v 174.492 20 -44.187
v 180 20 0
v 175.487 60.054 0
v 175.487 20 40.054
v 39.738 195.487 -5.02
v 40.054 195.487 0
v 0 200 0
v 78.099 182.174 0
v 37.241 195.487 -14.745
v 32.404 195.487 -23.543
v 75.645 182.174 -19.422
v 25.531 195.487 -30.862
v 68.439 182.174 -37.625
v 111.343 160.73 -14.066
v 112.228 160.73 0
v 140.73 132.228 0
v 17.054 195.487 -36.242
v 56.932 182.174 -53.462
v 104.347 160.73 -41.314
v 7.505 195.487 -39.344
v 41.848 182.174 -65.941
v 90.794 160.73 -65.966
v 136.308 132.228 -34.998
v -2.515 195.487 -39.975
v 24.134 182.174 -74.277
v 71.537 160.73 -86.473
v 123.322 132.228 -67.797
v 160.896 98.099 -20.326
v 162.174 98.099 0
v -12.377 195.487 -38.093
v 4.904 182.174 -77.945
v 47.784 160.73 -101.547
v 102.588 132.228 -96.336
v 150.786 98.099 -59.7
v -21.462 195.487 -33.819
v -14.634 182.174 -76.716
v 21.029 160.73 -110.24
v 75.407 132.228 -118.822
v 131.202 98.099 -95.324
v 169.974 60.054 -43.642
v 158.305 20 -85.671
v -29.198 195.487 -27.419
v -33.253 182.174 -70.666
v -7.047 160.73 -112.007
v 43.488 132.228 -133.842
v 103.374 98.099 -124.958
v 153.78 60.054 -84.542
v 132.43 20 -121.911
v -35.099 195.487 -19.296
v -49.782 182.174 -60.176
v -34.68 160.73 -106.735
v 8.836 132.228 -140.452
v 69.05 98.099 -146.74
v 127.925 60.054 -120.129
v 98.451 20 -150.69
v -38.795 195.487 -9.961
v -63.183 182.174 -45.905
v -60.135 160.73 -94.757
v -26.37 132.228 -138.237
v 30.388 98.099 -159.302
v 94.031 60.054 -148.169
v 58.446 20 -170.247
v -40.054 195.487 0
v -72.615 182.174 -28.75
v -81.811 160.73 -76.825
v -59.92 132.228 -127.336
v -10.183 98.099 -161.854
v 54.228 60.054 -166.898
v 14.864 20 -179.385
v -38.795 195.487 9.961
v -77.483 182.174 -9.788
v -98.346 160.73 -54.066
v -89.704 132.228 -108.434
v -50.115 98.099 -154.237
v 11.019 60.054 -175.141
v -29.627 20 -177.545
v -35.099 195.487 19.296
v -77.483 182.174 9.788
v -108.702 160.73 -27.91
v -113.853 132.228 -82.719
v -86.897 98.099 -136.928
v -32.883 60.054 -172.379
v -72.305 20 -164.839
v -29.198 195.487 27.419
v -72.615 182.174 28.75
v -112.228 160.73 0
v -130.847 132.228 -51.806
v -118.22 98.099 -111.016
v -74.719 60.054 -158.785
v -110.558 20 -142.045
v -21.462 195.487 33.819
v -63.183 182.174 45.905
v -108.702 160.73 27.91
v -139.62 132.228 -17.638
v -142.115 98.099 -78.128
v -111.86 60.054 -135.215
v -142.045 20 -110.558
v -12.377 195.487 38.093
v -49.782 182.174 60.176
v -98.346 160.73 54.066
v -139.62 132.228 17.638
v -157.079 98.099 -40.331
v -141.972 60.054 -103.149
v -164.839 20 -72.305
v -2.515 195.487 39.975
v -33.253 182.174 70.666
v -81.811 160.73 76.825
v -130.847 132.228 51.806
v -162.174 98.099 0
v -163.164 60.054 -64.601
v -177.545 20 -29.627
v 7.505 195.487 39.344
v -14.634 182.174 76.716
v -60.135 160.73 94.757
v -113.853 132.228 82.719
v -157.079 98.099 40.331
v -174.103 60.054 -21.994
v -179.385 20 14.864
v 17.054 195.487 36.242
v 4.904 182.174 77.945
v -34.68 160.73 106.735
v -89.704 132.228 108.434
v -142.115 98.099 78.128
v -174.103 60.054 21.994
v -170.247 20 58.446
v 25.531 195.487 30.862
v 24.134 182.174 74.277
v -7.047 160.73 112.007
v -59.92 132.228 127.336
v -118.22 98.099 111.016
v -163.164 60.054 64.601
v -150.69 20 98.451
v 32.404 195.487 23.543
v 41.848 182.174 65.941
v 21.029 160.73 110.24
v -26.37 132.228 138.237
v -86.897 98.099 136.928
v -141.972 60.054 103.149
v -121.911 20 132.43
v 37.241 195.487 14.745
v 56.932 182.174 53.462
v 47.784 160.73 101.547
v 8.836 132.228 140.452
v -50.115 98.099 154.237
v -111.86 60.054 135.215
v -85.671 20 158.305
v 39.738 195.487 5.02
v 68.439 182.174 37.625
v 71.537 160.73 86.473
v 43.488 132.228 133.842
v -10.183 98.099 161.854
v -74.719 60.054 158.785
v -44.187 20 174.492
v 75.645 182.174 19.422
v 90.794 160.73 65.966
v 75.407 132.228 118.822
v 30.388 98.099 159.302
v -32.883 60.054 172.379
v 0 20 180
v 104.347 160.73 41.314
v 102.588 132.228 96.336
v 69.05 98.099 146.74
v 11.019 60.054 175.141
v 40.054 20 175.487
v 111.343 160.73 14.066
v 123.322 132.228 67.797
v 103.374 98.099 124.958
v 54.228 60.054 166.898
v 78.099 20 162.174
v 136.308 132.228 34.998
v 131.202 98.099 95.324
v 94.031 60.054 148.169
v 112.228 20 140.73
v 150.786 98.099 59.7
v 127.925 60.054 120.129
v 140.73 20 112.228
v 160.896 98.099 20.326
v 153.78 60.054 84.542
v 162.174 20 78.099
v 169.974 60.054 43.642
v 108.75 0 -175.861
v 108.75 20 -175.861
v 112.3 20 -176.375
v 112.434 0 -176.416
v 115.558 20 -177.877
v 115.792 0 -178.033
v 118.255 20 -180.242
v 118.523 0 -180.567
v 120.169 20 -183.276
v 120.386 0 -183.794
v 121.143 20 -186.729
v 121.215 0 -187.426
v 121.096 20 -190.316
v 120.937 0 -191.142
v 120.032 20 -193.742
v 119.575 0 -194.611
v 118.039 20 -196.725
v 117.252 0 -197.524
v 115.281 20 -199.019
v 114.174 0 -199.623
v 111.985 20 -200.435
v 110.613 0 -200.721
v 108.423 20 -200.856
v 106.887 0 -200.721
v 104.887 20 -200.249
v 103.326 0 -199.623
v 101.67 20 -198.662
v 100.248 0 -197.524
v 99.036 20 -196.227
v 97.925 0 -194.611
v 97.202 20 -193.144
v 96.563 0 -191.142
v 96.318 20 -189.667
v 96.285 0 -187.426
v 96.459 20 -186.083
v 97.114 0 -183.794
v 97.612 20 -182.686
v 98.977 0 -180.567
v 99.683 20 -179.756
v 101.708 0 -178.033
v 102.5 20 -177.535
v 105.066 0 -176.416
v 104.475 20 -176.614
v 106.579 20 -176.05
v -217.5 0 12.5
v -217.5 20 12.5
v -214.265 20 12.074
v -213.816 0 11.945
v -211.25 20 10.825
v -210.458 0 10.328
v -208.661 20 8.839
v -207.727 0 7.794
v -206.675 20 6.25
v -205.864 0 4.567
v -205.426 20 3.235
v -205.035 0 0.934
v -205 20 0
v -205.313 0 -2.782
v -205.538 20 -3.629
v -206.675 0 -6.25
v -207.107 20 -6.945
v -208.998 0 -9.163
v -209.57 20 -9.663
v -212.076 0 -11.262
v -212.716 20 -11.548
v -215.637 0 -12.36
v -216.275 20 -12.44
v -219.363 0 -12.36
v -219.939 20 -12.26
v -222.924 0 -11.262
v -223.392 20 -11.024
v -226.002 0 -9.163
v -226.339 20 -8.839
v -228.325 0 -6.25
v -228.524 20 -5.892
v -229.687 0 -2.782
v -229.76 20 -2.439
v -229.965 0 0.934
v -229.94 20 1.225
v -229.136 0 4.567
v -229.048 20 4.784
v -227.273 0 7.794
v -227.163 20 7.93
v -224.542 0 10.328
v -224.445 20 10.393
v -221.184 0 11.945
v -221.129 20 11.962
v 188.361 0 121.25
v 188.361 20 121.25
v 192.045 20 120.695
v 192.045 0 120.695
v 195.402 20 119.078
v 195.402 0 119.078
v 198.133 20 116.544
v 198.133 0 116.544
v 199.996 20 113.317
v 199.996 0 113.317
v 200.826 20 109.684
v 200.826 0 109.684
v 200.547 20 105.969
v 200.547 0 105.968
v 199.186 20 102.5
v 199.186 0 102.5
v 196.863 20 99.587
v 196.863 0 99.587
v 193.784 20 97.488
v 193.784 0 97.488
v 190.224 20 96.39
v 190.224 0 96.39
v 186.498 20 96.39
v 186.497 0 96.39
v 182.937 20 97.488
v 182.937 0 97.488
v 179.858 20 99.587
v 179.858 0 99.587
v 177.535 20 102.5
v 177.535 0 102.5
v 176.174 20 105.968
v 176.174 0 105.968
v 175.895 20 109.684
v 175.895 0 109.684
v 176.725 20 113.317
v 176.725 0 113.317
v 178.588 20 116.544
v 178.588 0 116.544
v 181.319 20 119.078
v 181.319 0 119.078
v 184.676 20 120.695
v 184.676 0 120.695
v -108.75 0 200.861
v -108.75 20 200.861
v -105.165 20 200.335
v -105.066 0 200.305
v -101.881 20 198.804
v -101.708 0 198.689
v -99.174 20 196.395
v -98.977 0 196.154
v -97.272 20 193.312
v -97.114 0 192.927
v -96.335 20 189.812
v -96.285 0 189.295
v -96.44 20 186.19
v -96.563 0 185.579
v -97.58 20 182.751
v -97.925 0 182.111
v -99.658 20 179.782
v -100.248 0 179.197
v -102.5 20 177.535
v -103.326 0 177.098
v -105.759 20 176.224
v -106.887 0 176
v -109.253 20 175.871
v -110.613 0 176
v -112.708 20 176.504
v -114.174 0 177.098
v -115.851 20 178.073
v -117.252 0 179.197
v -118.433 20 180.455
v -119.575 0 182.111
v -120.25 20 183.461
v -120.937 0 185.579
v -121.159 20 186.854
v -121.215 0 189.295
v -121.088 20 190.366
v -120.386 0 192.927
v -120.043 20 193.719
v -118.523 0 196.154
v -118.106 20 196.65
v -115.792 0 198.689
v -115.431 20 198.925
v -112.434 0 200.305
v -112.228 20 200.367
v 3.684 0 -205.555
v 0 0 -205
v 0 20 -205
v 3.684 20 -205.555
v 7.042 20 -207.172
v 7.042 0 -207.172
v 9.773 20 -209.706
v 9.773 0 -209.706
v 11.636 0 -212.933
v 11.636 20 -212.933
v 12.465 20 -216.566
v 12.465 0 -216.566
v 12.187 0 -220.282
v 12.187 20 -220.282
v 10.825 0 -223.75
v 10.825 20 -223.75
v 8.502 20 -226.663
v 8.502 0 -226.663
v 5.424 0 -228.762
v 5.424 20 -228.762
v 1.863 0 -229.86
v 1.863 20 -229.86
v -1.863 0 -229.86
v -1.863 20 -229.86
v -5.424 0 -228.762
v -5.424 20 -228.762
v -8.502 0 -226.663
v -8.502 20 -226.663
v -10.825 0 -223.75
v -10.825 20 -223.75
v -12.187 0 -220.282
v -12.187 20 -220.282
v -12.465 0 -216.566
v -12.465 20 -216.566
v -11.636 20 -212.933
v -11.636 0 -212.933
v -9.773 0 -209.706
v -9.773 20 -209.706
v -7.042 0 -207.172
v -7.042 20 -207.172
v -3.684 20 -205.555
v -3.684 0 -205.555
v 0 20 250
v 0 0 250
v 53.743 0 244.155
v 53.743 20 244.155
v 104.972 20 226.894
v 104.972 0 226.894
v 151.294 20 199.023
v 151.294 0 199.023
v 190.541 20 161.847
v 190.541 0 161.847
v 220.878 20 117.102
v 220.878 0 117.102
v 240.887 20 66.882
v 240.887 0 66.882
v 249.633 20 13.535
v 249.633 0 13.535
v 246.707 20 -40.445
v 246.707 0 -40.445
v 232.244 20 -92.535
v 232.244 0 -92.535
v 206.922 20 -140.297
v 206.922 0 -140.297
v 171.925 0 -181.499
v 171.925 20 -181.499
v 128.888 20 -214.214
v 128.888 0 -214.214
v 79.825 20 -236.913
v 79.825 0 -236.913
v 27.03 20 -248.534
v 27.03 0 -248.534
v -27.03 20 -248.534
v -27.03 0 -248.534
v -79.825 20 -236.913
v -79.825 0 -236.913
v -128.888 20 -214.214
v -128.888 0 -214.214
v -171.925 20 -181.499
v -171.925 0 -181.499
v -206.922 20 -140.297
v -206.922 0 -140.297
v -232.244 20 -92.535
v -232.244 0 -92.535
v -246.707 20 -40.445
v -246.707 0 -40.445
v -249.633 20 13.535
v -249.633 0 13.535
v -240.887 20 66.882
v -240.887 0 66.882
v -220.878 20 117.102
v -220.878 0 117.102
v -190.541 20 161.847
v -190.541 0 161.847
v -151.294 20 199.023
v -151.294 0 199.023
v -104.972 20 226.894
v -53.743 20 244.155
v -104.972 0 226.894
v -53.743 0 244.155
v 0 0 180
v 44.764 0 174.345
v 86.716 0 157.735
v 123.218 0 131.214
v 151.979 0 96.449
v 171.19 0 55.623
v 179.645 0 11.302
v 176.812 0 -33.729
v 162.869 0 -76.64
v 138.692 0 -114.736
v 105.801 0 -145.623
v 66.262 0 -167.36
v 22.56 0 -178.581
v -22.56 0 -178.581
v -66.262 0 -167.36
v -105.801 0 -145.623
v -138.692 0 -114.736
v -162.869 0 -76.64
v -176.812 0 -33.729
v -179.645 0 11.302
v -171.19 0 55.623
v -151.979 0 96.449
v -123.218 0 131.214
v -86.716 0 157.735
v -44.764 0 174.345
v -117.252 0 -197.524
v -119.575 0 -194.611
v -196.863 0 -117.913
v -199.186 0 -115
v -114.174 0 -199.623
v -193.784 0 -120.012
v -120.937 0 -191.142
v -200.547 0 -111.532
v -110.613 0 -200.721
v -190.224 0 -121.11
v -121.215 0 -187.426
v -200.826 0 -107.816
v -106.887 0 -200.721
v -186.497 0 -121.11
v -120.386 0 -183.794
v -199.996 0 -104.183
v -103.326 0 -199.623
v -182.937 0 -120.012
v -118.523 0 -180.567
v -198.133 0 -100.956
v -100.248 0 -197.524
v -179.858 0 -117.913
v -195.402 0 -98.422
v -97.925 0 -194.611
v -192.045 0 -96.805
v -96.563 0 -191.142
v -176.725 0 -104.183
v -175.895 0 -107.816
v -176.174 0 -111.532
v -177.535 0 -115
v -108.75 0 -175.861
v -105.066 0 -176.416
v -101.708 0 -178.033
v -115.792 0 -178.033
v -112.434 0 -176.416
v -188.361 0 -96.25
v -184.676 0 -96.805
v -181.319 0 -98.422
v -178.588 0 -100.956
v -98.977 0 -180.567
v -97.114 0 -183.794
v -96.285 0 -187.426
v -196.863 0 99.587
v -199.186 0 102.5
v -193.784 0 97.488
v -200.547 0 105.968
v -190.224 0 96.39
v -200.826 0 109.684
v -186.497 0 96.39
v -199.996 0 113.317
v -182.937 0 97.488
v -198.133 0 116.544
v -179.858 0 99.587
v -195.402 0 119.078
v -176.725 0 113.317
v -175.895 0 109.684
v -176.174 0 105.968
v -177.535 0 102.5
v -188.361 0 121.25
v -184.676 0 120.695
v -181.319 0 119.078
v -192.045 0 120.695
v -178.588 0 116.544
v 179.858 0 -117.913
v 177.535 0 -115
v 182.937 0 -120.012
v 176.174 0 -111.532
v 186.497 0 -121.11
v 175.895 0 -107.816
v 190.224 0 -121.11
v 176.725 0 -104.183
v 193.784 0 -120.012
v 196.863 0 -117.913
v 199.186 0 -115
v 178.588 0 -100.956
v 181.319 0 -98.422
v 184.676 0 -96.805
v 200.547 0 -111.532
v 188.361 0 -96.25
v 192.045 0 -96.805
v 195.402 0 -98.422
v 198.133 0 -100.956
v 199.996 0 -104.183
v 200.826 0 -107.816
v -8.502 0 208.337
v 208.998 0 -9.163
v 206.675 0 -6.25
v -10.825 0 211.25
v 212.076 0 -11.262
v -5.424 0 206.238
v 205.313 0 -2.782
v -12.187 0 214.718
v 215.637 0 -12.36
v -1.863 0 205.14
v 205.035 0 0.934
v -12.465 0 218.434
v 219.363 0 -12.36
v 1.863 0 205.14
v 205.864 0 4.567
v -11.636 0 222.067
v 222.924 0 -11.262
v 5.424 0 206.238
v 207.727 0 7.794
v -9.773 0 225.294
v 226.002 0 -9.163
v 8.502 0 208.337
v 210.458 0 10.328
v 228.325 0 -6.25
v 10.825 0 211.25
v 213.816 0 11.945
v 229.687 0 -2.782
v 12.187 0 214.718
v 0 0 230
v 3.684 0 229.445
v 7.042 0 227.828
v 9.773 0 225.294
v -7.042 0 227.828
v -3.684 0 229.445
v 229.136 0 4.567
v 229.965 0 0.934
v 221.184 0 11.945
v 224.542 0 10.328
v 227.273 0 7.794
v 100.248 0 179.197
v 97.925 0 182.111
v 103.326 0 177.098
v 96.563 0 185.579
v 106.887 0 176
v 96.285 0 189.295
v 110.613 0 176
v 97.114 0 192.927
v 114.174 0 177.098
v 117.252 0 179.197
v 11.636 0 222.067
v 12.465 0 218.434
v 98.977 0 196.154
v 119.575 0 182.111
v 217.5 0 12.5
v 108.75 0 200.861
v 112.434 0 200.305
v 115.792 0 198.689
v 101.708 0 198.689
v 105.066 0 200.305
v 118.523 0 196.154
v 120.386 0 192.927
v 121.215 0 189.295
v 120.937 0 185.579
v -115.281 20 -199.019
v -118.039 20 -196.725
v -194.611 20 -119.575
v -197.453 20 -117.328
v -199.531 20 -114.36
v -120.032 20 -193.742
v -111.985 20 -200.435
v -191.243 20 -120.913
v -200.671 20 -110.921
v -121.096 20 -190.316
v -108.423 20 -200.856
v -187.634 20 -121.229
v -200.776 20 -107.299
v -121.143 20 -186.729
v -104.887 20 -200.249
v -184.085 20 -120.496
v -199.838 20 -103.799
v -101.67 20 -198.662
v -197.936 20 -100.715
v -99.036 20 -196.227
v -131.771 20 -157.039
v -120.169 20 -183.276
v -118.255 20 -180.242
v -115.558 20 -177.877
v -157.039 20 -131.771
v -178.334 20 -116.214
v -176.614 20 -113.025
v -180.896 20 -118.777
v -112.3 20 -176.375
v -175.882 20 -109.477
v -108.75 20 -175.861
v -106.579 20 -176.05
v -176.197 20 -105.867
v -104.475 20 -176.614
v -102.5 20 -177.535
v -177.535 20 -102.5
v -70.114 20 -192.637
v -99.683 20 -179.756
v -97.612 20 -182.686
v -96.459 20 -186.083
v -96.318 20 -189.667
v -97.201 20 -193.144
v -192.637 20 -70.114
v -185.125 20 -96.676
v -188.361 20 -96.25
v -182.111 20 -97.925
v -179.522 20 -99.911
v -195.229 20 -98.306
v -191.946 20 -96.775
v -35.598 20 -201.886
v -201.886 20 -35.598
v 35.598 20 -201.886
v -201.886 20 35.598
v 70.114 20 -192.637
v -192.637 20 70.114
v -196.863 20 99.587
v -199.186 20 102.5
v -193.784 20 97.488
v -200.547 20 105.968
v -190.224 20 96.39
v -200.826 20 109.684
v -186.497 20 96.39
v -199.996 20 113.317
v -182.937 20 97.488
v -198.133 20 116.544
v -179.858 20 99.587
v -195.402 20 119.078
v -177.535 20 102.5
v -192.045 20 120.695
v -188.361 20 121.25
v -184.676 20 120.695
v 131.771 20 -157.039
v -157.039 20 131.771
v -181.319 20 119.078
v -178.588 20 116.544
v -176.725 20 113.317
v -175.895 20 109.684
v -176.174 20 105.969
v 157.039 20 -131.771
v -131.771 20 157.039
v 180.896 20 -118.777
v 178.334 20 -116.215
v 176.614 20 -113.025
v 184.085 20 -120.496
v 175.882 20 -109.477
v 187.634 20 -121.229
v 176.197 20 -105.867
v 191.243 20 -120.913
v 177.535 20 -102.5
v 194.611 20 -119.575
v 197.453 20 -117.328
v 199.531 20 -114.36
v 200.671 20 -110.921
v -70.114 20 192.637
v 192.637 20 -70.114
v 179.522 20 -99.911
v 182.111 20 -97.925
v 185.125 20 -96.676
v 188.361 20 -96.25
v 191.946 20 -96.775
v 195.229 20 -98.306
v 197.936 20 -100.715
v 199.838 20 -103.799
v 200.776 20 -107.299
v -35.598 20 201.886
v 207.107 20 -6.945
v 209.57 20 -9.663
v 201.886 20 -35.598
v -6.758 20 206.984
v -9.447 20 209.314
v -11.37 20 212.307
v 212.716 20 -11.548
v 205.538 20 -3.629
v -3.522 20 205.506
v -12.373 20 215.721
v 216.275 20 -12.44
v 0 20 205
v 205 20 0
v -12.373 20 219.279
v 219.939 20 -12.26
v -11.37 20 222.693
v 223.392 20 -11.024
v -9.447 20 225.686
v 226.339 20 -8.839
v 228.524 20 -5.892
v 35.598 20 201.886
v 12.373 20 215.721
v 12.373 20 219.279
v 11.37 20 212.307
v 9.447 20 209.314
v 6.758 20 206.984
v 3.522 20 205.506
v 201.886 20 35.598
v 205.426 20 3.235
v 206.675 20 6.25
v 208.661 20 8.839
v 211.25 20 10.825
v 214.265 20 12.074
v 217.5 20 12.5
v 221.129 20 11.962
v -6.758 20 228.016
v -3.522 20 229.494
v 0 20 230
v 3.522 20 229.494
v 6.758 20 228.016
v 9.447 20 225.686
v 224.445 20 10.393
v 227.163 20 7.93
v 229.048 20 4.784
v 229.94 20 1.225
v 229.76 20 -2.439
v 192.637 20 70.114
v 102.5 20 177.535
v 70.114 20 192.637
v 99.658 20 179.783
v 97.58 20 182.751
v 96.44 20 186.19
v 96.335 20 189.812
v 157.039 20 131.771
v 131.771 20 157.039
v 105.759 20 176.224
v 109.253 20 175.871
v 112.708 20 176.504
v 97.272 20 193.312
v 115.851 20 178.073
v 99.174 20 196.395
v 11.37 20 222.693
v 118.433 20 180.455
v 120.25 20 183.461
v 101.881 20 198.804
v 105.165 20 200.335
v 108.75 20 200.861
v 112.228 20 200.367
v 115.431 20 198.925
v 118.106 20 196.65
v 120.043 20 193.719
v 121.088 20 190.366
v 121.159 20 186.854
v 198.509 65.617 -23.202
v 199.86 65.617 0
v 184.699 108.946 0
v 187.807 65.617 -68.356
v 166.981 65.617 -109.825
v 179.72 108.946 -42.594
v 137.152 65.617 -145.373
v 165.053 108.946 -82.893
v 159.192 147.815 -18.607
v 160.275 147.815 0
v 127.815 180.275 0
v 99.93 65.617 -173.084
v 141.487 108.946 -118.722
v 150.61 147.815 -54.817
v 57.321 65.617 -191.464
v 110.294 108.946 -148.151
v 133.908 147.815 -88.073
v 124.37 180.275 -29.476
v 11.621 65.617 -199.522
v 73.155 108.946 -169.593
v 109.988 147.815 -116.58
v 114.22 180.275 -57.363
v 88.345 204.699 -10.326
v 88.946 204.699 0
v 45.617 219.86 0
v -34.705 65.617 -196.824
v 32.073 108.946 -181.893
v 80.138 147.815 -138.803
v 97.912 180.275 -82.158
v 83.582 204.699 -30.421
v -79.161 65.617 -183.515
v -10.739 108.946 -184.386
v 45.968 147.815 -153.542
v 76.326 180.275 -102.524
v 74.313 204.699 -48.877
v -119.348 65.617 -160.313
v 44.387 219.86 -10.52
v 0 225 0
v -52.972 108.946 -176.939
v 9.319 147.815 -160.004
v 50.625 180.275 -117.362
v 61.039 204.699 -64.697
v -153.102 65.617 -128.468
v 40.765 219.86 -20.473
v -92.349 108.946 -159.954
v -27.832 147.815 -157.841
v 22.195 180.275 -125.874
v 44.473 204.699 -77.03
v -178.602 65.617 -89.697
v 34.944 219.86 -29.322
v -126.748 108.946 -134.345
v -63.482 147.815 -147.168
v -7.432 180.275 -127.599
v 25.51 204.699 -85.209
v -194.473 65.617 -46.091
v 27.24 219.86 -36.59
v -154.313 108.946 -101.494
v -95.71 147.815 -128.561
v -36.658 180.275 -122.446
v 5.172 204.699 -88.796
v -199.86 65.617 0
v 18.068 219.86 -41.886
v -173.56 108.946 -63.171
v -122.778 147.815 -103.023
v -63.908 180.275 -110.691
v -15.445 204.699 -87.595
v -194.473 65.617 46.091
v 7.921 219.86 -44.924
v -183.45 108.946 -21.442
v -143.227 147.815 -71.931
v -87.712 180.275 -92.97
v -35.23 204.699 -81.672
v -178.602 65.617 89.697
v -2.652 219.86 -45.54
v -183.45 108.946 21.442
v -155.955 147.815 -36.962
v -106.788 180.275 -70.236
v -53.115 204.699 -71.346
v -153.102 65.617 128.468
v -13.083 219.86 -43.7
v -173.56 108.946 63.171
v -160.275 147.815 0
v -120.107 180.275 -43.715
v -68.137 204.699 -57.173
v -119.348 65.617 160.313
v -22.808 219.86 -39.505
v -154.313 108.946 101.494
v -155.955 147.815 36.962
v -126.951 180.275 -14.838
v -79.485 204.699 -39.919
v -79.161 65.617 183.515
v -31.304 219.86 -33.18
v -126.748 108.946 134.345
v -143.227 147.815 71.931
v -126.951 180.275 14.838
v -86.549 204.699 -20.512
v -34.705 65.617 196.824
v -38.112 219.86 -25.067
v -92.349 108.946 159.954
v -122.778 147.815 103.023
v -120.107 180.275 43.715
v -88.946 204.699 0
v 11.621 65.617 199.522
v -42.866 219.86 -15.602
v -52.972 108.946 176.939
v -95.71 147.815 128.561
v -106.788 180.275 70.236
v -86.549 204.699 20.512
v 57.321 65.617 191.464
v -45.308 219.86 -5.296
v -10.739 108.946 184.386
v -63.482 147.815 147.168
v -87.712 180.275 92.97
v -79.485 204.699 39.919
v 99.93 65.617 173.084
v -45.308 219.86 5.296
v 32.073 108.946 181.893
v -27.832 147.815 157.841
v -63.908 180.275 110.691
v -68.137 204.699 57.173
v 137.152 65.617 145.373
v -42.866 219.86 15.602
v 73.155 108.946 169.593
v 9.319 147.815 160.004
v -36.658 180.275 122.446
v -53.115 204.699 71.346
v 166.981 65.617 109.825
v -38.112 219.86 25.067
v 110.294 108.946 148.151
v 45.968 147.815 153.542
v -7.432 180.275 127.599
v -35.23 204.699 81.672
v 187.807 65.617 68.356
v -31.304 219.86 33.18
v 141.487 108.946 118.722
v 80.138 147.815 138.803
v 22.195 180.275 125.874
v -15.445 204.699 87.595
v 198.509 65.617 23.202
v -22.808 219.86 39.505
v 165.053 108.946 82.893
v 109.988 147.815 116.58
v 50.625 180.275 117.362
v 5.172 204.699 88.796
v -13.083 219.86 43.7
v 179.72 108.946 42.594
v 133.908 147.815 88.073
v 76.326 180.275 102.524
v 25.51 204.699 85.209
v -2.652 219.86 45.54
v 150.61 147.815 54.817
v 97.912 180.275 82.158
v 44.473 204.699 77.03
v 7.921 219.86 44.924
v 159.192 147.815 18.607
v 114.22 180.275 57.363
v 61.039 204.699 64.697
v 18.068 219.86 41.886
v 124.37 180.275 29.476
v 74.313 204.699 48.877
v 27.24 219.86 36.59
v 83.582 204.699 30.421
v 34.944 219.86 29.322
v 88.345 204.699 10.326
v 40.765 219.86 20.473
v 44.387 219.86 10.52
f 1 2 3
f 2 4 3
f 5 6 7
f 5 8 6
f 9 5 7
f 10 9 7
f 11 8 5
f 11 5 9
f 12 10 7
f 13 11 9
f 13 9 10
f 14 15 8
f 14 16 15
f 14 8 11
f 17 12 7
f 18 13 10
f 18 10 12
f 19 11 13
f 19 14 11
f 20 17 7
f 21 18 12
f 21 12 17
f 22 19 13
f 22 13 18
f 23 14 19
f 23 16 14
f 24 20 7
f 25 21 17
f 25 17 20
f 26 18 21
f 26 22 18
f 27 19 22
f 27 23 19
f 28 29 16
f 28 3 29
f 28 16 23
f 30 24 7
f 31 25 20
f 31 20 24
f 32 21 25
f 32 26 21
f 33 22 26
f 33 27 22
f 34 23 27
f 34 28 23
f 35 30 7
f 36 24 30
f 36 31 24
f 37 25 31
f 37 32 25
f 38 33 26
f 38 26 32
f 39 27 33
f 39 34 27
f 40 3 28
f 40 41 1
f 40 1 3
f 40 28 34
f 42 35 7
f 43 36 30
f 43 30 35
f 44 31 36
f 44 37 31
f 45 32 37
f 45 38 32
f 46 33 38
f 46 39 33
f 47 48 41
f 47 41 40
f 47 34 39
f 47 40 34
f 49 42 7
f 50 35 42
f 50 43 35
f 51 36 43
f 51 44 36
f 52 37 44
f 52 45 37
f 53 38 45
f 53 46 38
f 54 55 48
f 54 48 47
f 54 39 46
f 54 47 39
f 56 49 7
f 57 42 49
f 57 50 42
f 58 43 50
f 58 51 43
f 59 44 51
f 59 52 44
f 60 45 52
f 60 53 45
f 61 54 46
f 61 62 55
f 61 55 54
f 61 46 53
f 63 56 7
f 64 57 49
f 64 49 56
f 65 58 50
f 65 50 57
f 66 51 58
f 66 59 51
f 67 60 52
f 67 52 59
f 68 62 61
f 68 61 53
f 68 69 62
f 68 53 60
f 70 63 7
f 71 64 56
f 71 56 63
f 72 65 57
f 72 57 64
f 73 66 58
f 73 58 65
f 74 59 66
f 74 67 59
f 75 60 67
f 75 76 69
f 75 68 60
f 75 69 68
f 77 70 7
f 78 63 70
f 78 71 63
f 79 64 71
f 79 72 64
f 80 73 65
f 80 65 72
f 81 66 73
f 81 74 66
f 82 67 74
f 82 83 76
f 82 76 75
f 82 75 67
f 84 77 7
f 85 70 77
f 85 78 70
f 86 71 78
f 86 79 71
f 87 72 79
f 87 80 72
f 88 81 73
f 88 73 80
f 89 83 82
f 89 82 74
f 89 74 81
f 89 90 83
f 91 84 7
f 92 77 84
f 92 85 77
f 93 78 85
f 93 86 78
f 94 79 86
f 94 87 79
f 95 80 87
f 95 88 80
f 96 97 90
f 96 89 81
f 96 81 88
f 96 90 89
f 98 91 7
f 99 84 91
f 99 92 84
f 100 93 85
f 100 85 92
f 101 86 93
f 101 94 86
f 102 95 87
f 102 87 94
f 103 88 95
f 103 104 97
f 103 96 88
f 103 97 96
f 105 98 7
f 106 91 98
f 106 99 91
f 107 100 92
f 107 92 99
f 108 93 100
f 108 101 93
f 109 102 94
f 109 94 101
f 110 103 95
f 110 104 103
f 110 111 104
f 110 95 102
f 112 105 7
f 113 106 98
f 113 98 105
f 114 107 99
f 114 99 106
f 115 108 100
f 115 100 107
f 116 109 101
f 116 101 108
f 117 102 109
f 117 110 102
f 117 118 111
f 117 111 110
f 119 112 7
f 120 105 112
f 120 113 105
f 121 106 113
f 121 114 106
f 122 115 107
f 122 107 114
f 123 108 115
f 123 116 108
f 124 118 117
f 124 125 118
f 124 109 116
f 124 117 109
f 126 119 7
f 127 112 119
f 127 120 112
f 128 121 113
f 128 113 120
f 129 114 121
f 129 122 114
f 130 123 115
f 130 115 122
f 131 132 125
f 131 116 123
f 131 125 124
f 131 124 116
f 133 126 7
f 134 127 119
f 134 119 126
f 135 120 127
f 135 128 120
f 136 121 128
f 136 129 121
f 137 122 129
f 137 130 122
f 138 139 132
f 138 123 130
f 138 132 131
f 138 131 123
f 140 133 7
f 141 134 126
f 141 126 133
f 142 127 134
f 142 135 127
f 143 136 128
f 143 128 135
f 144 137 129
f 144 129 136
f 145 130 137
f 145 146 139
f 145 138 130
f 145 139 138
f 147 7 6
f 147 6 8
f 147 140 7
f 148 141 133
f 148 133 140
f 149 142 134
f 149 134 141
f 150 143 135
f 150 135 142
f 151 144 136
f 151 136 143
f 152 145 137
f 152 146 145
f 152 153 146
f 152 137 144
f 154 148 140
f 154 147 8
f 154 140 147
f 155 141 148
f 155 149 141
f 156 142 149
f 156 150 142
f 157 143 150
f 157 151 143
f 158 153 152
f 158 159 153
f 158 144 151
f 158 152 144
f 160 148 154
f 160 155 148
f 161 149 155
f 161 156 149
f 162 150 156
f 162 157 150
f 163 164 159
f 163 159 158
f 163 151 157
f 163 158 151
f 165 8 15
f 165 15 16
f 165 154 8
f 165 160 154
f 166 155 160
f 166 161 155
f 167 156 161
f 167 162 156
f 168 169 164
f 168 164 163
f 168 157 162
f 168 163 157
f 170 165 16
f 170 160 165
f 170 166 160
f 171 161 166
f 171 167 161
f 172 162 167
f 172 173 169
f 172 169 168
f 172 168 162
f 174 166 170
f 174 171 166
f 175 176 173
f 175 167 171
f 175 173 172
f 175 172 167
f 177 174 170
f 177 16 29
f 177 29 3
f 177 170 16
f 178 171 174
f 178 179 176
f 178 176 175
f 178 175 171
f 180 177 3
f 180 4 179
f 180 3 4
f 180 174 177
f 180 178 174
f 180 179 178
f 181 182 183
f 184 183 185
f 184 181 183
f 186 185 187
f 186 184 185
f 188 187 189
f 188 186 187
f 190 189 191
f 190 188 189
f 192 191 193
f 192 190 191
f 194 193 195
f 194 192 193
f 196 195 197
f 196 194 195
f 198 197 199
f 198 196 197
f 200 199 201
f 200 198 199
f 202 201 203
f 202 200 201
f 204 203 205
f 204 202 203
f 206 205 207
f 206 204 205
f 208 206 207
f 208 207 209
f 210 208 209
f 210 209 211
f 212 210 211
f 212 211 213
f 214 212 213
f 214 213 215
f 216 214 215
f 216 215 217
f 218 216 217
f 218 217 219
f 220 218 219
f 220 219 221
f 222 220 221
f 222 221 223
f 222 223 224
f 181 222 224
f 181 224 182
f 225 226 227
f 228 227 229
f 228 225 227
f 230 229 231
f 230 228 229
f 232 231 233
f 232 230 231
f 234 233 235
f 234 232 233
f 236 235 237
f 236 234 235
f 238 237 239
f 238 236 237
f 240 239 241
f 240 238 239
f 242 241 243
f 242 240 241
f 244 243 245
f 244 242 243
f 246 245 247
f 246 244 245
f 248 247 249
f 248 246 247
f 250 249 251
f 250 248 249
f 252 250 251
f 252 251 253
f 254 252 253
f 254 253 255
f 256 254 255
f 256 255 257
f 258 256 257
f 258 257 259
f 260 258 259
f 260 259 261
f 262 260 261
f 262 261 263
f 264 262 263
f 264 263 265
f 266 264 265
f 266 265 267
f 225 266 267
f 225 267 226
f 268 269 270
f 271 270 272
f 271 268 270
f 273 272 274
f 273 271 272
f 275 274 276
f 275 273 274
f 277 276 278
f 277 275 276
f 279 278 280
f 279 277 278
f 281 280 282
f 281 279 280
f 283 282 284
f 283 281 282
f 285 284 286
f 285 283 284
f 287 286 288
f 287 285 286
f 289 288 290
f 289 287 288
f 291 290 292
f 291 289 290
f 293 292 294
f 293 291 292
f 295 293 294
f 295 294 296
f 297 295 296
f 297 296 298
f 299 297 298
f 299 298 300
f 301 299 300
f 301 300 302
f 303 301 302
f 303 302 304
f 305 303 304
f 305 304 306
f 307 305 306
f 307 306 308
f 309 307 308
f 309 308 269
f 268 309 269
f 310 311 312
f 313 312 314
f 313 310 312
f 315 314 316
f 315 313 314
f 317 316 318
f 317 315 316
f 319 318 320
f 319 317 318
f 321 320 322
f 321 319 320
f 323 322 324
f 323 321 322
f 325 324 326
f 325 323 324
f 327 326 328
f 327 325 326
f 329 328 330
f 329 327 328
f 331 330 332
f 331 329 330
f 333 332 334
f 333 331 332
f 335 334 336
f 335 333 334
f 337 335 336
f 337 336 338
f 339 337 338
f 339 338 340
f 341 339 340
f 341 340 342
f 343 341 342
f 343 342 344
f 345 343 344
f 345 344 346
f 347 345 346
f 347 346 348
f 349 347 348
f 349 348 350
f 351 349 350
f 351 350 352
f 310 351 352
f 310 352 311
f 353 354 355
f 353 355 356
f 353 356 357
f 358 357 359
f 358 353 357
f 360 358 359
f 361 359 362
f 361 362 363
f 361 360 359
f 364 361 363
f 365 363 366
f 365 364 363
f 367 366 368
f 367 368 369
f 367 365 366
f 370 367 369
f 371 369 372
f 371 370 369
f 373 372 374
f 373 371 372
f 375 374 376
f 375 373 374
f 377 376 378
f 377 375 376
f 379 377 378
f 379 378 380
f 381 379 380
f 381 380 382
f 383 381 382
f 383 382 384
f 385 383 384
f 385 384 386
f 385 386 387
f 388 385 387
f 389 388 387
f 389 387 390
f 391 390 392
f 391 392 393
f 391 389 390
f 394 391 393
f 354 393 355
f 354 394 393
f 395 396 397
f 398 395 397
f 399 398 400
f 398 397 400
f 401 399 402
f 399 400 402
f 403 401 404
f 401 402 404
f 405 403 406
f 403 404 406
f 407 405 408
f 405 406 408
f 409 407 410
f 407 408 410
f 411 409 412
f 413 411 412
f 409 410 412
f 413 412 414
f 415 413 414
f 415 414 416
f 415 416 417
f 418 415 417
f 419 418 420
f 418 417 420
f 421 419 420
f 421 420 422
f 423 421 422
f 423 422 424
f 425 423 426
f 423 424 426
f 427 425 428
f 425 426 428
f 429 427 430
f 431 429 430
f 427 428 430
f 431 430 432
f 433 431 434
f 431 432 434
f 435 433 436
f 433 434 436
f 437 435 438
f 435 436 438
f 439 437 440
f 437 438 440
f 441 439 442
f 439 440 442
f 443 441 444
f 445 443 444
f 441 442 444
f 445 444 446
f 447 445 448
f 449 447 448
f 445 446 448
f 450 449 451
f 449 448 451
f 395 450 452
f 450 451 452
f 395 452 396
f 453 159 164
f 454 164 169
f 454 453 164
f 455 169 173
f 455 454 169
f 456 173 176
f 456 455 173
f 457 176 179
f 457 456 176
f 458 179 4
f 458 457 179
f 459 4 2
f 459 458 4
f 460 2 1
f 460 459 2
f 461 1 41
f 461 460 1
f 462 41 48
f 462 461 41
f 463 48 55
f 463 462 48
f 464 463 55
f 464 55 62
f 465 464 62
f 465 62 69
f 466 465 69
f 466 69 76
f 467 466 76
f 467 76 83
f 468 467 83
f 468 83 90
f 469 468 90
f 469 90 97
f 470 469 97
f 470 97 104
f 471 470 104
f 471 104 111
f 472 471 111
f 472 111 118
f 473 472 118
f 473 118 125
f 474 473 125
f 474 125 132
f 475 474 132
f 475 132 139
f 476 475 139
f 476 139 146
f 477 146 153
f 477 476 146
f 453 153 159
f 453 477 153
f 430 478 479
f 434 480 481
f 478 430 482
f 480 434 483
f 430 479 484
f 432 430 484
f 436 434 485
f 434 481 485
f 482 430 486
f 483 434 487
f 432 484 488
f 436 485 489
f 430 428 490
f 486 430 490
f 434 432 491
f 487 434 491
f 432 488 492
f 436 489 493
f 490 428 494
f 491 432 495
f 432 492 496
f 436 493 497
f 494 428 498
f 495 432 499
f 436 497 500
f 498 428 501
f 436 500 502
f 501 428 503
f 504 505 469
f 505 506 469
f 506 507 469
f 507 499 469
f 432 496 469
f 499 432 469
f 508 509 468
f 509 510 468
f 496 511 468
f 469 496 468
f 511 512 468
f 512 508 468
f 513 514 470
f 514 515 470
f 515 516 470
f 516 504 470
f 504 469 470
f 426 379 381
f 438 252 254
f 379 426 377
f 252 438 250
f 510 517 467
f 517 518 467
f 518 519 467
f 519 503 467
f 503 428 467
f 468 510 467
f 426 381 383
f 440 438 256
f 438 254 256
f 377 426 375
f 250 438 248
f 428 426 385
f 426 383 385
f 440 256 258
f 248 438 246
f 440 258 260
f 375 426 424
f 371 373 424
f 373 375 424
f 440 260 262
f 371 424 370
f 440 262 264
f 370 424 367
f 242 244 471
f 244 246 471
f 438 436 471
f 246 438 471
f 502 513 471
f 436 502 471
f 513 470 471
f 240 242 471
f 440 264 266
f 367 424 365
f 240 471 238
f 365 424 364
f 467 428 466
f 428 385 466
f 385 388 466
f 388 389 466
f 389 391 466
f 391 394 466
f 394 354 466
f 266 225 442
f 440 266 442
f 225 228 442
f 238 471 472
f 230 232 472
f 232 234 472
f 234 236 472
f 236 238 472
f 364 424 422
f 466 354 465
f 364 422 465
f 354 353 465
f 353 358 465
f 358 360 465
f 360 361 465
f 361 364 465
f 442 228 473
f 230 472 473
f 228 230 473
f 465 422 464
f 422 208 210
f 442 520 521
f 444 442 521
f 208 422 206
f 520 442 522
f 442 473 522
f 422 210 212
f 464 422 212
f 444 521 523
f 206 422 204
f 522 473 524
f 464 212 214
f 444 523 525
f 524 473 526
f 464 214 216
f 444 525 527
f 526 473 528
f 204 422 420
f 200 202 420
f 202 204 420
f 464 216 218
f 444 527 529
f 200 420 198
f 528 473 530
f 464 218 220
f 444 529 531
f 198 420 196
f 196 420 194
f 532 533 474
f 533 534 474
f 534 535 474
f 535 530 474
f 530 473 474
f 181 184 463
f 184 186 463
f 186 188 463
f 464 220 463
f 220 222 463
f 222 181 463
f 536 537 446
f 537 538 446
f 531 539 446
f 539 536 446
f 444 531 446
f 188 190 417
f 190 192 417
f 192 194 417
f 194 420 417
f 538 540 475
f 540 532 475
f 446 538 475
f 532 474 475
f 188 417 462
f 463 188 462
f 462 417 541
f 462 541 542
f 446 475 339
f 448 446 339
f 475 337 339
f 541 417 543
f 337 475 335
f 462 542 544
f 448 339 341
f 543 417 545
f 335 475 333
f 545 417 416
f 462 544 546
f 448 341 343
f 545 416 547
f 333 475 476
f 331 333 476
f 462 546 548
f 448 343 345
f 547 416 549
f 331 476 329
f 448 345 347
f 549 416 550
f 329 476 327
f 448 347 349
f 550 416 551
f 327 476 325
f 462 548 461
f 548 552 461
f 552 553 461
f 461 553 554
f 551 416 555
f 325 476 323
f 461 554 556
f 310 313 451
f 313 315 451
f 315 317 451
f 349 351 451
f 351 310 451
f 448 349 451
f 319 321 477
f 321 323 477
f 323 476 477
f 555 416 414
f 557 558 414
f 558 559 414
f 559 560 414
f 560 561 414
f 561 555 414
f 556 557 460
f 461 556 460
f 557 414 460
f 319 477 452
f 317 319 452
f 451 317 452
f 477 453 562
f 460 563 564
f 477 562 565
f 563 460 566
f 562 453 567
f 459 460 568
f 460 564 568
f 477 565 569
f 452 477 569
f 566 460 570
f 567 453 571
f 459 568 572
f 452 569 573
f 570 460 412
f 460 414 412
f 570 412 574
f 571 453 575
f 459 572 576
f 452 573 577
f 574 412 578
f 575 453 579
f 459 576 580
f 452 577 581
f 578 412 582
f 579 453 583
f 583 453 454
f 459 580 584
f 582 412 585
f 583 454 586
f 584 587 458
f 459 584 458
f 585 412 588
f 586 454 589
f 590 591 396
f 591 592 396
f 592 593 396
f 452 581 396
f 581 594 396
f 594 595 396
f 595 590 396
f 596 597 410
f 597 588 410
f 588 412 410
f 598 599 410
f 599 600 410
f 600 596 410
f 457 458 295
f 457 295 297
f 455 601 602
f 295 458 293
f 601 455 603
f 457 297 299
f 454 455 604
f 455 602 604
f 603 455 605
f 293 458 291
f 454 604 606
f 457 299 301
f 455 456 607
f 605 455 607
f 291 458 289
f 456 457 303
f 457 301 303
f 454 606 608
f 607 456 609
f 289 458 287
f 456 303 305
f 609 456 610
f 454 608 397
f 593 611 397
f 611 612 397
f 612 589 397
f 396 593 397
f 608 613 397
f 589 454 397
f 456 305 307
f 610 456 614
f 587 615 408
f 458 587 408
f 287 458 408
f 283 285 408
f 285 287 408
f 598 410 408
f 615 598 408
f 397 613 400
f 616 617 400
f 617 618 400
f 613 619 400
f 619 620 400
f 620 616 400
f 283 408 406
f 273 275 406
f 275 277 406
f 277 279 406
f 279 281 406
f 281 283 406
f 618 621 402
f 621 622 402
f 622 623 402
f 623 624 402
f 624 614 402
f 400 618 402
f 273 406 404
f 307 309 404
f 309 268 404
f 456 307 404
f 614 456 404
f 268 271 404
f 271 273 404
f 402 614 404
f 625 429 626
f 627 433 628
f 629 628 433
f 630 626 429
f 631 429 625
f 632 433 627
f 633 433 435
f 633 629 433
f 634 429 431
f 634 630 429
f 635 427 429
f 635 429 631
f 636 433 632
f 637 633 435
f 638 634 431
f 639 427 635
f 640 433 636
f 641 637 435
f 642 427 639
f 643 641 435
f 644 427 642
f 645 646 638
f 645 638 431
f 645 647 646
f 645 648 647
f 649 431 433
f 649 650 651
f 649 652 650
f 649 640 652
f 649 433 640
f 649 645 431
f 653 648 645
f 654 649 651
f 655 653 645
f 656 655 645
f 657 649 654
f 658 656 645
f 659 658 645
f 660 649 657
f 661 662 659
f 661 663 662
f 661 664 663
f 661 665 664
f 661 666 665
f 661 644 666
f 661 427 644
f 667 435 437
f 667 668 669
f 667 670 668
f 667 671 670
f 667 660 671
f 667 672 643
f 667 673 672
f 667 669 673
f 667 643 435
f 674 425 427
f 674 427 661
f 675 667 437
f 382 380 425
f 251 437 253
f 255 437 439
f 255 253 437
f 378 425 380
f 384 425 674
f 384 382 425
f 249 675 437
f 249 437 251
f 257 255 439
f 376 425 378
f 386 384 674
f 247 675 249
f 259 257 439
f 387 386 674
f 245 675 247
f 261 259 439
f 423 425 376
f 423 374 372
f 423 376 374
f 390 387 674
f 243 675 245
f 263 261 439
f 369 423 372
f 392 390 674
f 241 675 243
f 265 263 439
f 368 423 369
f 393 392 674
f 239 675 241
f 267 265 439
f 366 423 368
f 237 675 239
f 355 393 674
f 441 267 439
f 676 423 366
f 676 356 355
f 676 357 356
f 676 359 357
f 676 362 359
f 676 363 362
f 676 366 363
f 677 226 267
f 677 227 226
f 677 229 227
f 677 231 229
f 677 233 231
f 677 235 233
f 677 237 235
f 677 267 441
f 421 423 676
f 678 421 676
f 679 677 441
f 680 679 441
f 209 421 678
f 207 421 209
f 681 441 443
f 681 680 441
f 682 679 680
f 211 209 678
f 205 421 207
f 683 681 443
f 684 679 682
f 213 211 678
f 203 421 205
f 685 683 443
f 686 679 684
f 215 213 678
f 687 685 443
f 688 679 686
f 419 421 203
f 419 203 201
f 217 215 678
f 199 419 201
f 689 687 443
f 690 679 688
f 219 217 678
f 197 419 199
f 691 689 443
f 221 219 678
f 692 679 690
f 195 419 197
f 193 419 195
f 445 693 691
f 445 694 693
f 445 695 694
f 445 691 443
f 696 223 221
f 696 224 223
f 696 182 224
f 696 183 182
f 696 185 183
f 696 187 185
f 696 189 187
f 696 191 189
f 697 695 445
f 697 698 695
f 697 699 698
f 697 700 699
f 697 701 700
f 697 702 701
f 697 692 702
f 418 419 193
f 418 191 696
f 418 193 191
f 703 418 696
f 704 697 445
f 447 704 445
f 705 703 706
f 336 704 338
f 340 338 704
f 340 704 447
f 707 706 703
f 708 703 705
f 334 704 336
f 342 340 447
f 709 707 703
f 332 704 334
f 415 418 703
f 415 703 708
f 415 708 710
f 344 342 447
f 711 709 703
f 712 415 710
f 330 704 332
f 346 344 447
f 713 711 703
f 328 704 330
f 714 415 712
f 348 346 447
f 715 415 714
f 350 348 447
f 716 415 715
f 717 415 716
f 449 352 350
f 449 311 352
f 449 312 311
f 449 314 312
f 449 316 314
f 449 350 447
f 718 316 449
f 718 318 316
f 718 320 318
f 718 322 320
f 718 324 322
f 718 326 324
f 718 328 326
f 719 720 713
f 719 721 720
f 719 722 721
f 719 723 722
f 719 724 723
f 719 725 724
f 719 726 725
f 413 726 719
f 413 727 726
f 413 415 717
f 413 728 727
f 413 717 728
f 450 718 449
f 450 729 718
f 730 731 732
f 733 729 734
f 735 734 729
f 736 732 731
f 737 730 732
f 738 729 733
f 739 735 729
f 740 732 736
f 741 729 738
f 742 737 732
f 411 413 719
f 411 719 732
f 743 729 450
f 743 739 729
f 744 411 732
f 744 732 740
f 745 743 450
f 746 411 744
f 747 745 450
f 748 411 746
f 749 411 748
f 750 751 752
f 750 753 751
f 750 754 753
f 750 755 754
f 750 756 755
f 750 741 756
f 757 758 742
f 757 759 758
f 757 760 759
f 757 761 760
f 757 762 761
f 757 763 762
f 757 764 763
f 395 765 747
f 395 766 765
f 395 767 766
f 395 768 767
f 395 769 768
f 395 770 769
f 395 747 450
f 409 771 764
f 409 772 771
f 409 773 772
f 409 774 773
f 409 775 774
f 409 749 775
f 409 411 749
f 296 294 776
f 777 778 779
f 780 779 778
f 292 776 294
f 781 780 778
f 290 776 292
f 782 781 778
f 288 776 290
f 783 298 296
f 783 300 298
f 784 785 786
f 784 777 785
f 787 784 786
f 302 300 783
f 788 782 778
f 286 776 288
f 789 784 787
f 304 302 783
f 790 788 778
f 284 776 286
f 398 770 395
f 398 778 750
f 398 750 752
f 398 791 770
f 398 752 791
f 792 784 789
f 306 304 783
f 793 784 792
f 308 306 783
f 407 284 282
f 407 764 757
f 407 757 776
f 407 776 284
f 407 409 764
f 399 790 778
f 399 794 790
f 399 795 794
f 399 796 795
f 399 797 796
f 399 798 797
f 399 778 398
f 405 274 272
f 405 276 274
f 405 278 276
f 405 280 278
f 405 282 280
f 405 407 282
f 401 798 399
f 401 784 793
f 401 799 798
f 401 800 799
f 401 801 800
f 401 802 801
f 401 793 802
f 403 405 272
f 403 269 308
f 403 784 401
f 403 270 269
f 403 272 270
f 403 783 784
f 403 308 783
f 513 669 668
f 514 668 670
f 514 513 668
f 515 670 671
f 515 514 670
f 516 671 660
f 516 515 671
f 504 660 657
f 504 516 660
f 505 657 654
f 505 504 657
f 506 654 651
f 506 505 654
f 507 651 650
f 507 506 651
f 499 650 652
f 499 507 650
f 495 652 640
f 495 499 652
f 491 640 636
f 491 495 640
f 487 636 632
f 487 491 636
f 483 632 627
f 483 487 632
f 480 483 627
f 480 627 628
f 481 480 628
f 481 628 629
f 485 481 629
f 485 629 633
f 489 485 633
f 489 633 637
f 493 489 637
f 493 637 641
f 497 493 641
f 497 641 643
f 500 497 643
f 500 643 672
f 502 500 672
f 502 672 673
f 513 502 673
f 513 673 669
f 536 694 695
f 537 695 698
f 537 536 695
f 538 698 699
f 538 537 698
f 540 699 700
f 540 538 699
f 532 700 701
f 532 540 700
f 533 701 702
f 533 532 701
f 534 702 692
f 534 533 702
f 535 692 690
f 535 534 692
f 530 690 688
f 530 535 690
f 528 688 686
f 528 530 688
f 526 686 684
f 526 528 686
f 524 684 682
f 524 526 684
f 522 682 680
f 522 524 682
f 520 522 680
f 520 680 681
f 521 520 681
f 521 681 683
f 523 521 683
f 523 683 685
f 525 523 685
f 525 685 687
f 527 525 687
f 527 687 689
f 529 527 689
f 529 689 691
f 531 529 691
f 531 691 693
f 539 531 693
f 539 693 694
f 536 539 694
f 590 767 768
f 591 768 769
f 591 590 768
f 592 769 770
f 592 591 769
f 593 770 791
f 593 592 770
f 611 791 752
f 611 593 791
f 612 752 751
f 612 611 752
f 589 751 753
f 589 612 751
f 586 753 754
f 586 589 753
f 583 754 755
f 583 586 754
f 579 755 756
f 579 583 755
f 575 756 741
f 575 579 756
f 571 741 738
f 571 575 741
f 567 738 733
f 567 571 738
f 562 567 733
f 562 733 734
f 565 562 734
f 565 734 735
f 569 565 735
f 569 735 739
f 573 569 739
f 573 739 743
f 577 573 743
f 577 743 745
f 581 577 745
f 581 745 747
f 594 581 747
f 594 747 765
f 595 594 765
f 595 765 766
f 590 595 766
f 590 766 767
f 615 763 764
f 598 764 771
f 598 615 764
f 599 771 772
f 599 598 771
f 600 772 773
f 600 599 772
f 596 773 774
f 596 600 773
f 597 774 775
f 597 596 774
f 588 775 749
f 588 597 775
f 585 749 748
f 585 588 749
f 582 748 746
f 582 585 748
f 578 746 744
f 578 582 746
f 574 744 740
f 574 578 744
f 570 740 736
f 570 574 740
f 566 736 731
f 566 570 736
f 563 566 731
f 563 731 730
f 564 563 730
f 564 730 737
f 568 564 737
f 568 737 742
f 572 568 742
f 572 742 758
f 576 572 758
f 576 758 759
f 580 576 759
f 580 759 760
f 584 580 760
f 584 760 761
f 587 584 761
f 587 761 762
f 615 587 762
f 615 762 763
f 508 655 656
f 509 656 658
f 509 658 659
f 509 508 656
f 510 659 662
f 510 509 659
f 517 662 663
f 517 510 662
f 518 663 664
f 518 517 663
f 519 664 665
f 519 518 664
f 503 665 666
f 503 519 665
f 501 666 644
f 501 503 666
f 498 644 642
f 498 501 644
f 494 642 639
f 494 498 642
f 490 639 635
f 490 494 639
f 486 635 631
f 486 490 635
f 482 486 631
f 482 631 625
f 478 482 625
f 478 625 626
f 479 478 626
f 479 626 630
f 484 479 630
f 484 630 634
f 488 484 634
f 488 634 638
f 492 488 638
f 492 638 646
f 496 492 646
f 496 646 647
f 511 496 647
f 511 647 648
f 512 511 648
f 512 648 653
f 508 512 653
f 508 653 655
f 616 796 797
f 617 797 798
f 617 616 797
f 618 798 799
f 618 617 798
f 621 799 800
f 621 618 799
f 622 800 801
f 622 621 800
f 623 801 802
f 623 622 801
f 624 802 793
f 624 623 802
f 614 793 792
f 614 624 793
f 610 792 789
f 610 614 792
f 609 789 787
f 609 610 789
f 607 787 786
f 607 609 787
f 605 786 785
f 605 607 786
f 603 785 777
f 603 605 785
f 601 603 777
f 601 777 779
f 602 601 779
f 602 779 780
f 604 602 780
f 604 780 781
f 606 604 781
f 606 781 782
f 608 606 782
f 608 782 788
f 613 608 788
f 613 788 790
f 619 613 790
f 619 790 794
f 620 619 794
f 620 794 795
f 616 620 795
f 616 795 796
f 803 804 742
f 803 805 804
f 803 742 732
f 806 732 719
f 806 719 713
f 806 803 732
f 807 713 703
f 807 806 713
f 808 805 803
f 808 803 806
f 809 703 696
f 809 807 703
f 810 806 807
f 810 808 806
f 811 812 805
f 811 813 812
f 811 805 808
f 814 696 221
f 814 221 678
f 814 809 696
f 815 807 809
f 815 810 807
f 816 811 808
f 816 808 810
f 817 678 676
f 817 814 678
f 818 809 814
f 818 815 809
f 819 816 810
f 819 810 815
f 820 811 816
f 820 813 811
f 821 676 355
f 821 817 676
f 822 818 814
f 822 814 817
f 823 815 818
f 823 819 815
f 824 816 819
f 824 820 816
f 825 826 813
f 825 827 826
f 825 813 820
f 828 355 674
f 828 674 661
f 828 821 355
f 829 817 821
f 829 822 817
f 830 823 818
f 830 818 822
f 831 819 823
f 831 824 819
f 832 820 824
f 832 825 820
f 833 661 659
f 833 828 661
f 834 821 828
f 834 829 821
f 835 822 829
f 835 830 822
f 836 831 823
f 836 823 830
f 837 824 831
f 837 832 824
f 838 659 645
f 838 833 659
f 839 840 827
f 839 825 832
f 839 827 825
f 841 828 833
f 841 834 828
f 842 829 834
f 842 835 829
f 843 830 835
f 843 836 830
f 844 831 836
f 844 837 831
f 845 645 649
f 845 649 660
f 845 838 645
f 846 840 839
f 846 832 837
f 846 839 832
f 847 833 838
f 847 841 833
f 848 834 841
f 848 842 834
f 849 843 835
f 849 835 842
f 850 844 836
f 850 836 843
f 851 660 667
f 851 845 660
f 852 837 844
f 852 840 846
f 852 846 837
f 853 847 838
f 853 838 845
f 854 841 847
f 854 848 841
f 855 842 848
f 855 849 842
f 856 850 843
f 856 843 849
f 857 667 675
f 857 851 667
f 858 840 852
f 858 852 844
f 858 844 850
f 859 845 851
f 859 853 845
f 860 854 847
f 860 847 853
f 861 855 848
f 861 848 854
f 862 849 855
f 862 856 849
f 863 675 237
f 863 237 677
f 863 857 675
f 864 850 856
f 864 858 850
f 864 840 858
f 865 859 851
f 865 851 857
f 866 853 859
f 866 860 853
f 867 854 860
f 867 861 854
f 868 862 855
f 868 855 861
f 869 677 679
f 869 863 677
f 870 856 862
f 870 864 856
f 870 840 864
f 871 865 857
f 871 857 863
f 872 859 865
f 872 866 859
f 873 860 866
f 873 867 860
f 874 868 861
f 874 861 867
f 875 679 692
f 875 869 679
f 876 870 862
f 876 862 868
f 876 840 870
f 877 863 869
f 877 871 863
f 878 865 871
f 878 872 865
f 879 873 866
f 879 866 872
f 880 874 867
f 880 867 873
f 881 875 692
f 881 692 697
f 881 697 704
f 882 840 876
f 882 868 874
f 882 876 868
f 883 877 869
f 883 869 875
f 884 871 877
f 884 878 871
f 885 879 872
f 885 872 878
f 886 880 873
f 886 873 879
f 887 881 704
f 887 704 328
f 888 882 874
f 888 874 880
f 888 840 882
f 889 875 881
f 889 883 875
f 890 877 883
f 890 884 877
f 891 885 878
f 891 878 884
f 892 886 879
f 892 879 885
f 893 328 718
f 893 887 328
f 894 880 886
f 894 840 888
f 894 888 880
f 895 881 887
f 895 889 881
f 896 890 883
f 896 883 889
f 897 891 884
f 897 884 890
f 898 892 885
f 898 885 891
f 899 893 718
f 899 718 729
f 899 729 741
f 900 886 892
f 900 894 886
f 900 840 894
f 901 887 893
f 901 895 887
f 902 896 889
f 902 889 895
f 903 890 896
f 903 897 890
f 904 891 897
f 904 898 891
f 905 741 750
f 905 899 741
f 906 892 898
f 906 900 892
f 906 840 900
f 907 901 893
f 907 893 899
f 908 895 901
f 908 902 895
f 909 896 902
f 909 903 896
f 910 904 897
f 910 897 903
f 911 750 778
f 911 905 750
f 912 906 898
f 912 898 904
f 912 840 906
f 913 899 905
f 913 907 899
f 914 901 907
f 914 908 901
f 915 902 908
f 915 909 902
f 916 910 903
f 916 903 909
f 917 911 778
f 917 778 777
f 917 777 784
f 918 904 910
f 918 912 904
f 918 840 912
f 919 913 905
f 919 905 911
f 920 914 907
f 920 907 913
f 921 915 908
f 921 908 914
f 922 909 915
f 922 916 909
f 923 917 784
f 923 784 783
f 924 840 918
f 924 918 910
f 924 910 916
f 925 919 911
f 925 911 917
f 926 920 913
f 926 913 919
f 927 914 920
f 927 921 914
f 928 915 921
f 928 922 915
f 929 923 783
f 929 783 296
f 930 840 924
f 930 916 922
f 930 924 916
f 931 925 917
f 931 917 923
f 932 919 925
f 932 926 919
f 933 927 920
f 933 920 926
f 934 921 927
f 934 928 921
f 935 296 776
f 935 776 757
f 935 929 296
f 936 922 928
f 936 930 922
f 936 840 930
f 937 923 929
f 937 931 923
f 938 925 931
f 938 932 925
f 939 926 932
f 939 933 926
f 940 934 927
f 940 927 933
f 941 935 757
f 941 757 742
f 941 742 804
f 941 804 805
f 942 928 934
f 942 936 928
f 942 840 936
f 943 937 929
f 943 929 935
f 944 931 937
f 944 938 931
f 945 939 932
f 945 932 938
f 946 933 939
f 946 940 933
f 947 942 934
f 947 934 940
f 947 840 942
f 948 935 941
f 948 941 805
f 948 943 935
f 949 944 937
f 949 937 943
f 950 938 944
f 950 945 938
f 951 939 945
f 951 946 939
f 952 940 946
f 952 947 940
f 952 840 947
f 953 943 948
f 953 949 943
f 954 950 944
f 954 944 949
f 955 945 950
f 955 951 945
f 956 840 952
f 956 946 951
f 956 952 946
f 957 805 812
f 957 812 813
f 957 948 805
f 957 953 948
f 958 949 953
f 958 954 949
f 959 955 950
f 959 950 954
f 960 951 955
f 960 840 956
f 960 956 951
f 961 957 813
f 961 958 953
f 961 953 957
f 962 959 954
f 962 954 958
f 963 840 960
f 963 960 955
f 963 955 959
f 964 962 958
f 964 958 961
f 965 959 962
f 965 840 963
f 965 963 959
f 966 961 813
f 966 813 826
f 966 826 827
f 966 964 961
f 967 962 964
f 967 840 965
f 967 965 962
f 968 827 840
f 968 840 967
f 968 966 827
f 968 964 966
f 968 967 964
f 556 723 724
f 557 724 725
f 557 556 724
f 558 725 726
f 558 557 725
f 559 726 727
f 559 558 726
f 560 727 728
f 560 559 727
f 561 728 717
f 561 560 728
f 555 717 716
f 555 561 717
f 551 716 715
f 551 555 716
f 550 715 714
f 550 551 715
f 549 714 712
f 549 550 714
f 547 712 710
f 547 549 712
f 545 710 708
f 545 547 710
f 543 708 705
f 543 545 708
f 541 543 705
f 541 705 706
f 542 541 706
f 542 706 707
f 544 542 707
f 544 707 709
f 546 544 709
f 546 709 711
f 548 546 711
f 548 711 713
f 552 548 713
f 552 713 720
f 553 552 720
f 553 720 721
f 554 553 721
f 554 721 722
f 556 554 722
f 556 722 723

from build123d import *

# Parameters (mm, degrees)
SKETCH1_R           = 250
SKETCH1_R_2         = 180
SKETCH1_R_3         = 12.5
BOSS_EXTRUDE1_DEPTH = 20


# Read off the part's stored shape, not the designer's step: Revolve1
with BuildPart() as part:
    # Sketch1 → Boss-Extrude1 (new body)
    with BuildSketch(Plane(origin=(0, 0, 0), x_dir=(1, 0, 0), z_dir=(0, 1, 0))):
        with Locations(Location((0, 0, 0), (0, 0, 270))):
            Circle(SKETCH1_R)
        with Locations(Location((0, 0, 0), (0, 0, 270))):
            Circle(SKETCH1_R_2, mode=Mode.SUBTRACT)
        with Locations(Location((0, 217.5, 0), (0, 0, 270))):
            Circle(SKETCH1_R_3, mode=Mode.SUBTRACT)
        with Locations(Location((108.75, 188.360525323, 0), (0, 0, 270))):
            Circle(SKETCH1_R_3, mode=Mode.SUBTRACT)
        with Locations(Location((188.360525323, 108.75, 0), (0, 0, 270))):
            Circle(SKETCH1_R_3, mode=Mode.SUBTRACT)
        with Locations(Location((217.5, 0, 0), (0, 0, 270))):
            Circle(SKETCH1_R_3, mode=Mode.SUBTRACT)
        with Locations(Location((188.360525323, -108.75, 0), (0, 0, 270))):
            Circle(SKETCH1_R_3, mode=Mode.SUBTRACT)
        with Locations(Location((108.75, -188.360525323, 0), (0, 0, 270))):
            Circle(SKETCH1_R_3, mode=Mode.SUBTRACT)
        with Locations(Location((0, -217.5, 0), (0, 0, 270))):
            Circle(SKETCH1_R_3, mode=Mode.SUBTRACT)
        with Locations(Location((-108.75, -188.360525323, 0), (0, 0, 270))):
            Circle(SKETCH1_R_3, mode=Mode.SUBTRACT)
        with Locations(Location((-188.360525323, -108.75, 0), (0, 0, 270))):
            Circle(SKETCH1_R_3, mode=Mode.SUBTRACT)
        with Locations(Location((-217.5, 0, 0), (0, 0, 270))):
            Circle(SKETCH1_R_3, mode=Mode.SUBTRACT)
        with Locations(Location((-188.360525323, 108.75, 0), (0, 0, 270))):
            Circle(SKETCH1_R_3, mode=Mode.SUBTRACT)
        with Locations(Location((-108.75, 188.360525323, 0), (0, 0, 270))):
            Circle(SKETCH1_R_3, mode=Mode.SUBTRACT)
    extrude(amount=BOSS_EXTRUDE1_DEPTH)

    # Revolve1 outline → Revolve1 (revolve)
    with BuildSketch(Plane.XY):
        with BuildLine():
            ThreePointArc((205, 19.9999999), (144.956890179, 164.956890108), (0, 225))
            Line((0, 225), (0, 200))
            ThreePointArc((0, 200), (127.279220649, 147.279220578), (180, 19.9999999))
            Line((180, 19.9999999), (205, 19.9999999))
        make_face()
    revolve(axis=Axis((0, 0, 0), (0, 1, 0)))


solid = part.part
